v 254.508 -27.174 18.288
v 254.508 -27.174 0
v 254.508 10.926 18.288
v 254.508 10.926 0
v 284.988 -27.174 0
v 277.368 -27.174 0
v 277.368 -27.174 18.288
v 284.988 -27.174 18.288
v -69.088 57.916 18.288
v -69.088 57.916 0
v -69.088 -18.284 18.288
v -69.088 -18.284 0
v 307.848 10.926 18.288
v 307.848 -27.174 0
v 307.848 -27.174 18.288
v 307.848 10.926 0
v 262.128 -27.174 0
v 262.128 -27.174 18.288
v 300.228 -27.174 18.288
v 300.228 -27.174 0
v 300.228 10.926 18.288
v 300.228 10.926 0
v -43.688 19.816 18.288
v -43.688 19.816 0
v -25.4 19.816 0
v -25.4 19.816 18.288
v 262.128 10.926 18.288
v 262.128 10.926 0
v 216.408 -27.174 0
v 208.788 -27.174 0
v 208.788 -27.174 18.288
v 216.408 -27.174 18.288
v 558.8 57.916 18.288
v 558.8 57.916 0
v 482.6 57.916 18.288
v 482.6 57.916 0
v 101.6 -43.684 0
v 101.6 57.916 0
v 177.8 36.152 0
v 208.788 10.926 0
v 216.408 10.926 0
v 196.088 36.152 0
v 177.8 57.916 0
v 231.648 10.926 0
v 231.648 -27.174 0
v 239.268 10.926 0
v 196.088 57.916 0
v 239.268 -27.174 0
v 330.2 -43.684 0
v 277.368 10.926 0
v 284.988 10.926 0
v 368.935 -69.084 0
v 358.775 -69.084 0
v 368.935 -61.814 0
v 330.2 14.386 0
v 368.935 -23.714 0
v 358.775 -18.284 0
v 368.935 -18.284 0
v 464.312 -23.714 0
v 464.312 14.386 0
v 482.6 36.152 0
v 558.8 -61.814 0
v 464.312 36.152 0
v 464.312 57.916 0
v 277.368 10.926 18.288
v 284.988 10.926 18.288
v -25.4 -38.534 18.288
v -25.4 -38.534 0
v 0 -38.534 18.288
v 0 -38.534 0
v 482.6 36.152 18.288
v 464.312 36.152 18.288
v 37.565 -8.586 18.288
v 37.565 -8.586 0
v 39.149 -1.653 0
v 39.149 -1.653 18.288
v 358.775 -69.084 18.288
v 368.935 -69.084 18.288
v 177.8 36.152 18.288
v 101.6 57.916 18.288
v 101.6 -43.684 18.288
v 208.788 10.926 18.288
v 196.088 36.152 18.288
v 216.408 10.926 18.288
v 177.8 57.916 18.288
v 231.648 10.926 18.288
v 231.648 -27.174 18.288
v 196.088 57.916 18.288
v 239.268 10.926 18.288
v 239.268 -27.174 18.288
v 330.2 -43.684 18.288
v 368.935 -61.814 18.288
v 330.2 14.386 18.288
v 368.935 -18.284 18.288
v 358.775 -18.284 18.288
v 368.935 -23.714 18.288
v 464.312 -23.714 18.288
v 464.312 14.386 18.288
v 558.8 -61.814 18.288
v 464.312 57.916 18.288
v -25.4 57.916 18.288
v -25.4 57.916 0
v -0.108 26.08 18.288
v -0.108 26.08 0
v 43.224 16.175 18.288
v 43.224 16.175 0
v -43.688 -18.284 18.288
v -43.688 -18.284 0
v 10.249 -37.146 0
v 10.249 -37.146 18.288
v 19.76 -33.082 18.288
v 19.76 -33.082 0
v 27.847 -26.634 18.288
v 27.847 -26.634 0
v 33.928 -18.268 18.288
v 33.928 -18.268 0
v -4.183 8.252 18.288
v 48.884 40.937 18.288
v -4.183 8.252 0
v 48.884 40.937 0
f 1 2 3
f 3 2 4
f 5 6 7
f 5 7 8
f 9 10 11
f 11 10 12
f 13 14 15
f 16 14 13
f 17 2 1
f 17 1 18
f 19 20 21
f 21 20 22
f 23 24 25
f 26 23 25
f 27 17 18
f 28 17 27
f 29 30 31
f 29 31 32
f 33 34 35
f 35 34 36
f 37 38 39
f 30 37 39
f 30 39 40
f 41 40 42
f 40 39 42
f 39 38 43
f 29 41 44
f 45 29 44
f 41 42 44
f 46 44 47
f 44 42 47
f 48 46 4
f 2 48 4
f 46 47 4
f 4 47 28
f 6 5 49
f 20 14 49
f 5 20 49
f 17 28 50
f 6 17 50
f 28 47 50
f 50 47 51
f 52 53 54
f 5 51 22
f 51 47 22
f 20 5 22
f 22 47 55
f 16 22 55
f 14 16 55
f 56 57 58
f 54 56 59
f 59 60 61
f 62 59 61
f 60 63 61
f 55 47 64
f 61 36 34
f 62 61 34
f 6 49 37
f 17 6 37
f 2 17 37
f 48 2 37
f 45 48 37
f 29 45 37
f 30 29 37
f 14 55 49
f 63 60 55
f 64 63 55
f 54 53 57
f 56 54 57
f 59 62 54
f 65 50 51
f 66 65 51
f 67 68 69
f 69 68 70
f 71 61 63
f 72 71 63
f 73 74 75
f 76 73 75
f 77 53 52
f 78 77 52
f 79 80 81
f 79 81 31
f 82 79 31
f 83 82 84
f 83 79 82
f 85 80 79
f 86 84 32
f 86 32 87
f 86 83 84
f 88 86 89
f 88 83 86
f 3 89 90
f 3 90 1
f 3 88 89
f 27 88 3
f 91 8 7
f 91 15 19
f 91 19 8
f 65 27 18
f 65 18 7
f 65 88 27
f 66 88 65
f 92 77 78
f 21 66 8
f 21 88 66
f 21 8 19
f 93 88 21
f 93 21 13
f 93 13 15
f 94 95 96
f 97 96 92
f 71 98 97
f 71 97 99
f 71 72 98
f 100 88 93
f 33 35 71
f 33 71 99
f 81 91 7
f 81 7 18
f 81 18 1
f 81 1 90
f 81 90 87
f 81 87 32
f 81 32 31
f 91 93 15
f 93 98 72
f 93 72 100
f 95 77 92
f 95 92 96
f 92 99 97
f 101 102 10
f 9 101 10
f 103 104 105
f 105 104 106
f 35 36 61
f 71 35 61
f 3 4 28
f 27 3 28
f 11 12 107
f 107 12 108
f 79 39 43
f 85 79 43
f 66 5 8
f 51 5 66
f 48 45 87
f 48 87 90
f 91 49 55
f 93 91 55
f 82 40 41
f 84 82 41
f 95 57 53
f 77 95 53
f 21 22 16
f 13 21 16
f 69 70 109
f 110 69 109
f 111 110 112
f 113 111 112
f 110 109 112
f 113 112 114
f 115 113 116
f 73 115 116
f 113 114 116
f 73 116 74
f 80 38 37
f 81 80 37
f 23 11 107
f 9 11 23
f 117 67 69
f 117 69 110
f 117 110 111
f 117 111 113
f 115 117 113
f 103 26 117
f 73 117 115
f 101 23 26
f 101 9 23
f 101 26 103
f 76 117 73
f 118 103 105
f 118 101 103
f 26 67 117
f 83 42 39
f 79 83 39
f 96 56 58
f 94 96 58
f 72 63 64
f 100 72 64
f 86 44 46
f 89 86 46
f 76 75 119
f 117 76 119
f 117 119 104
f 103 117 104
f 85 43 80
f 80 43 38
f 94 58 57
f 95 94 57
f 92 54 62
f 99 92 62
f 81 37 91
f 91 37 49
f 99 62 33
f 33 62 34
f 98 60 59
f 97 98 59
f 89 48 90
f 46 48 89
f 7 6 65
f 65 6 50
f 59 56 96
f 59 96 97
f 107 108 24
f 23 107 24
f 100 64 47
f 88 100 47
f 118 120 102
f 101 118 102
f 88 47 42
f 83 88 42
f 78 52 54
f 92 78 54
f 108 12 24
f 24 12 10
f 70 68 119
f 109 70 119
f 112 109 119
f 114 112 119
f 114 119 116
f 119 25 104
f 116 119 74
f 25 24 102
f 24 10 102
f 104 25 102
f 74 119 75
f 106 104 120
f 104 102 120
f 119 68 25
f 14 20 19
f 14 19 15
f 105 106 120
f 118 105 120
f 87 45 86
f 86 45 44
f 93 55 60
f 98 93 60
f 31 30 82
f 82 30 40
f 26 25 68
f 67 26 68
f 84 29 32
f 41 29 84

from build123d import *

# Parameters (mm, degrees)
F1_W     = 25.4
F1_H     = 38.1
F2_DEPTH = 18.288
F1_W_2   = 7.62
F1_W_3   = 95.377
F1_H_2   = 18.1300078465
F1_H_3   = 19.9699921535
F1_W_4   = 76.2


# Not quite as in the source:
# - a variable given as a bare number and used for a length is read in inches; the dataset says mm whatever the document's units were


with BuildPart() as f2:
    # F1 (on Top) → F2 (new body)
    with BuildSketch(Plane.XY):
        Polygon((-25.4, 57.9158396344), (-25.4, 19.8158396344), (-25.4, 5.8057135582), (0, 0), (37.5647200947, -8.58622066), (39.1494498942, -1.6530269181), (-4.1830109925, 8.2515343291), (-0.1079915079, 26.0797468083), (43.2244693788, 16.175185561), (48.884218663, 40.936591782), align=None)
        with BuildLine():
            Line((37.5647200947, -8.58622066), (0, 0))
            Line((0, 0), (0, -38.5335098455))
            ThreePointArc((0, -38.5335098455), (24.020555392, -30.1304546875), (37.5647200947, -8.58622066))
        make_face()
        Polygon((-69.088, 19.8158396344), (-43.688, 19.8158396344), (-25.4, 19.8158396344), (-25.4, 57.9158396344), (-69.088, 57.9158396344), align=None)
        with Locations((-56.388, 0.7658396344)):
            Rectangle(F1_W, F1_H)
        Polygon((0, 0), (-25.4, 5.8057135582), (-25.4, -38.5335098455), (0, -38.5335098455), align=None)
    extrude(amount=F2_DEPTH)


with BuildPart() as f2b:
    # F1 (on Top) → F2, piece 2 (new body)
    with BuildSketch(Plane.XY):
        Polygon((177.8, 57.9158396344), (101.6, 57.9158396344), (101.6, -43.6841603656), (330.2, -43.6841603656), (330.2, 14.3858317879), (368.935, 14.3858317879), (464.312, 14.3858317879), (464.312, -23.7141682121), (482.6, -23.7141682121), (482.6, 14.3858317879), (558.8, 14.3858317879), (558.8, 57.9158396344), (482.6, 57.9158396344), (482.6, 36.1516669545), (464.312, 36.1516669545), (464.312, 57.9158396344), (196.088, 57.9158396344), (196.088, 36.1516669545), (177.8, 36.1516669545), align=None)
        with Locations((212.598, -8.1241603656)):
            Rectangle(F1_W_2, F1_H, mode=Mode.SUBTRACT)
        with Locations((235.458, -8.1241603656)):
            Rectangle(F1_W_2, F1_H, mode=Mode.SUBTRACT)
        with Locations((258.318, -8.1241603656)):
            Rectangle(F1_W_2, F1_H, mode=Mode.SUBTRACT)
        with Locations((281.178, -8.1241603656)):
            Rectangle(F1_W_2, F1_H, mode=Mode.SUBTRACT)
        with Locations((304.038, -8.1241603656)):
            Rectangle(F1_W_2, F1_H, mode=Mode.SUBTRACT)
        Polygon((358.775, -18.2841603656), (358.775, -43.6841603656), (368.935, -43.6841603656), (368.935, -23.7141682121), (368.935, -18.2841603656), align=None)
        Polygon((368.935, -43.6841603656), (358.775, -43.6841603656), (358.775, -69.0841603656), (368.935, -69.0841603656), (368.935, -61.8141682121), align=None)
        with Locations((416.6235, -52.7491642889)):
            Rectangle(F1_W_3, F1_H_2)
        with Locations((416.6235, -33.6991642889)):
            Rectangle(F1_W_3, F1_H_3)
        Polygon((464.312, -23.7141682121), (464.312, -43.6841603656), (464.312, -61.8141682121), (558.8, -61.8141682121), (558.8, -43.6841603656), (558.8, -23.7141682121), (482.6, -23.7141682121), align=None)
        with Locations((520.7, -4.6641682121)):
            Rectangle(F1_W_4, F1_H)
    extrude(amount=F2_DEPTH)


solid = Compound([f2.part, f2b.part])
